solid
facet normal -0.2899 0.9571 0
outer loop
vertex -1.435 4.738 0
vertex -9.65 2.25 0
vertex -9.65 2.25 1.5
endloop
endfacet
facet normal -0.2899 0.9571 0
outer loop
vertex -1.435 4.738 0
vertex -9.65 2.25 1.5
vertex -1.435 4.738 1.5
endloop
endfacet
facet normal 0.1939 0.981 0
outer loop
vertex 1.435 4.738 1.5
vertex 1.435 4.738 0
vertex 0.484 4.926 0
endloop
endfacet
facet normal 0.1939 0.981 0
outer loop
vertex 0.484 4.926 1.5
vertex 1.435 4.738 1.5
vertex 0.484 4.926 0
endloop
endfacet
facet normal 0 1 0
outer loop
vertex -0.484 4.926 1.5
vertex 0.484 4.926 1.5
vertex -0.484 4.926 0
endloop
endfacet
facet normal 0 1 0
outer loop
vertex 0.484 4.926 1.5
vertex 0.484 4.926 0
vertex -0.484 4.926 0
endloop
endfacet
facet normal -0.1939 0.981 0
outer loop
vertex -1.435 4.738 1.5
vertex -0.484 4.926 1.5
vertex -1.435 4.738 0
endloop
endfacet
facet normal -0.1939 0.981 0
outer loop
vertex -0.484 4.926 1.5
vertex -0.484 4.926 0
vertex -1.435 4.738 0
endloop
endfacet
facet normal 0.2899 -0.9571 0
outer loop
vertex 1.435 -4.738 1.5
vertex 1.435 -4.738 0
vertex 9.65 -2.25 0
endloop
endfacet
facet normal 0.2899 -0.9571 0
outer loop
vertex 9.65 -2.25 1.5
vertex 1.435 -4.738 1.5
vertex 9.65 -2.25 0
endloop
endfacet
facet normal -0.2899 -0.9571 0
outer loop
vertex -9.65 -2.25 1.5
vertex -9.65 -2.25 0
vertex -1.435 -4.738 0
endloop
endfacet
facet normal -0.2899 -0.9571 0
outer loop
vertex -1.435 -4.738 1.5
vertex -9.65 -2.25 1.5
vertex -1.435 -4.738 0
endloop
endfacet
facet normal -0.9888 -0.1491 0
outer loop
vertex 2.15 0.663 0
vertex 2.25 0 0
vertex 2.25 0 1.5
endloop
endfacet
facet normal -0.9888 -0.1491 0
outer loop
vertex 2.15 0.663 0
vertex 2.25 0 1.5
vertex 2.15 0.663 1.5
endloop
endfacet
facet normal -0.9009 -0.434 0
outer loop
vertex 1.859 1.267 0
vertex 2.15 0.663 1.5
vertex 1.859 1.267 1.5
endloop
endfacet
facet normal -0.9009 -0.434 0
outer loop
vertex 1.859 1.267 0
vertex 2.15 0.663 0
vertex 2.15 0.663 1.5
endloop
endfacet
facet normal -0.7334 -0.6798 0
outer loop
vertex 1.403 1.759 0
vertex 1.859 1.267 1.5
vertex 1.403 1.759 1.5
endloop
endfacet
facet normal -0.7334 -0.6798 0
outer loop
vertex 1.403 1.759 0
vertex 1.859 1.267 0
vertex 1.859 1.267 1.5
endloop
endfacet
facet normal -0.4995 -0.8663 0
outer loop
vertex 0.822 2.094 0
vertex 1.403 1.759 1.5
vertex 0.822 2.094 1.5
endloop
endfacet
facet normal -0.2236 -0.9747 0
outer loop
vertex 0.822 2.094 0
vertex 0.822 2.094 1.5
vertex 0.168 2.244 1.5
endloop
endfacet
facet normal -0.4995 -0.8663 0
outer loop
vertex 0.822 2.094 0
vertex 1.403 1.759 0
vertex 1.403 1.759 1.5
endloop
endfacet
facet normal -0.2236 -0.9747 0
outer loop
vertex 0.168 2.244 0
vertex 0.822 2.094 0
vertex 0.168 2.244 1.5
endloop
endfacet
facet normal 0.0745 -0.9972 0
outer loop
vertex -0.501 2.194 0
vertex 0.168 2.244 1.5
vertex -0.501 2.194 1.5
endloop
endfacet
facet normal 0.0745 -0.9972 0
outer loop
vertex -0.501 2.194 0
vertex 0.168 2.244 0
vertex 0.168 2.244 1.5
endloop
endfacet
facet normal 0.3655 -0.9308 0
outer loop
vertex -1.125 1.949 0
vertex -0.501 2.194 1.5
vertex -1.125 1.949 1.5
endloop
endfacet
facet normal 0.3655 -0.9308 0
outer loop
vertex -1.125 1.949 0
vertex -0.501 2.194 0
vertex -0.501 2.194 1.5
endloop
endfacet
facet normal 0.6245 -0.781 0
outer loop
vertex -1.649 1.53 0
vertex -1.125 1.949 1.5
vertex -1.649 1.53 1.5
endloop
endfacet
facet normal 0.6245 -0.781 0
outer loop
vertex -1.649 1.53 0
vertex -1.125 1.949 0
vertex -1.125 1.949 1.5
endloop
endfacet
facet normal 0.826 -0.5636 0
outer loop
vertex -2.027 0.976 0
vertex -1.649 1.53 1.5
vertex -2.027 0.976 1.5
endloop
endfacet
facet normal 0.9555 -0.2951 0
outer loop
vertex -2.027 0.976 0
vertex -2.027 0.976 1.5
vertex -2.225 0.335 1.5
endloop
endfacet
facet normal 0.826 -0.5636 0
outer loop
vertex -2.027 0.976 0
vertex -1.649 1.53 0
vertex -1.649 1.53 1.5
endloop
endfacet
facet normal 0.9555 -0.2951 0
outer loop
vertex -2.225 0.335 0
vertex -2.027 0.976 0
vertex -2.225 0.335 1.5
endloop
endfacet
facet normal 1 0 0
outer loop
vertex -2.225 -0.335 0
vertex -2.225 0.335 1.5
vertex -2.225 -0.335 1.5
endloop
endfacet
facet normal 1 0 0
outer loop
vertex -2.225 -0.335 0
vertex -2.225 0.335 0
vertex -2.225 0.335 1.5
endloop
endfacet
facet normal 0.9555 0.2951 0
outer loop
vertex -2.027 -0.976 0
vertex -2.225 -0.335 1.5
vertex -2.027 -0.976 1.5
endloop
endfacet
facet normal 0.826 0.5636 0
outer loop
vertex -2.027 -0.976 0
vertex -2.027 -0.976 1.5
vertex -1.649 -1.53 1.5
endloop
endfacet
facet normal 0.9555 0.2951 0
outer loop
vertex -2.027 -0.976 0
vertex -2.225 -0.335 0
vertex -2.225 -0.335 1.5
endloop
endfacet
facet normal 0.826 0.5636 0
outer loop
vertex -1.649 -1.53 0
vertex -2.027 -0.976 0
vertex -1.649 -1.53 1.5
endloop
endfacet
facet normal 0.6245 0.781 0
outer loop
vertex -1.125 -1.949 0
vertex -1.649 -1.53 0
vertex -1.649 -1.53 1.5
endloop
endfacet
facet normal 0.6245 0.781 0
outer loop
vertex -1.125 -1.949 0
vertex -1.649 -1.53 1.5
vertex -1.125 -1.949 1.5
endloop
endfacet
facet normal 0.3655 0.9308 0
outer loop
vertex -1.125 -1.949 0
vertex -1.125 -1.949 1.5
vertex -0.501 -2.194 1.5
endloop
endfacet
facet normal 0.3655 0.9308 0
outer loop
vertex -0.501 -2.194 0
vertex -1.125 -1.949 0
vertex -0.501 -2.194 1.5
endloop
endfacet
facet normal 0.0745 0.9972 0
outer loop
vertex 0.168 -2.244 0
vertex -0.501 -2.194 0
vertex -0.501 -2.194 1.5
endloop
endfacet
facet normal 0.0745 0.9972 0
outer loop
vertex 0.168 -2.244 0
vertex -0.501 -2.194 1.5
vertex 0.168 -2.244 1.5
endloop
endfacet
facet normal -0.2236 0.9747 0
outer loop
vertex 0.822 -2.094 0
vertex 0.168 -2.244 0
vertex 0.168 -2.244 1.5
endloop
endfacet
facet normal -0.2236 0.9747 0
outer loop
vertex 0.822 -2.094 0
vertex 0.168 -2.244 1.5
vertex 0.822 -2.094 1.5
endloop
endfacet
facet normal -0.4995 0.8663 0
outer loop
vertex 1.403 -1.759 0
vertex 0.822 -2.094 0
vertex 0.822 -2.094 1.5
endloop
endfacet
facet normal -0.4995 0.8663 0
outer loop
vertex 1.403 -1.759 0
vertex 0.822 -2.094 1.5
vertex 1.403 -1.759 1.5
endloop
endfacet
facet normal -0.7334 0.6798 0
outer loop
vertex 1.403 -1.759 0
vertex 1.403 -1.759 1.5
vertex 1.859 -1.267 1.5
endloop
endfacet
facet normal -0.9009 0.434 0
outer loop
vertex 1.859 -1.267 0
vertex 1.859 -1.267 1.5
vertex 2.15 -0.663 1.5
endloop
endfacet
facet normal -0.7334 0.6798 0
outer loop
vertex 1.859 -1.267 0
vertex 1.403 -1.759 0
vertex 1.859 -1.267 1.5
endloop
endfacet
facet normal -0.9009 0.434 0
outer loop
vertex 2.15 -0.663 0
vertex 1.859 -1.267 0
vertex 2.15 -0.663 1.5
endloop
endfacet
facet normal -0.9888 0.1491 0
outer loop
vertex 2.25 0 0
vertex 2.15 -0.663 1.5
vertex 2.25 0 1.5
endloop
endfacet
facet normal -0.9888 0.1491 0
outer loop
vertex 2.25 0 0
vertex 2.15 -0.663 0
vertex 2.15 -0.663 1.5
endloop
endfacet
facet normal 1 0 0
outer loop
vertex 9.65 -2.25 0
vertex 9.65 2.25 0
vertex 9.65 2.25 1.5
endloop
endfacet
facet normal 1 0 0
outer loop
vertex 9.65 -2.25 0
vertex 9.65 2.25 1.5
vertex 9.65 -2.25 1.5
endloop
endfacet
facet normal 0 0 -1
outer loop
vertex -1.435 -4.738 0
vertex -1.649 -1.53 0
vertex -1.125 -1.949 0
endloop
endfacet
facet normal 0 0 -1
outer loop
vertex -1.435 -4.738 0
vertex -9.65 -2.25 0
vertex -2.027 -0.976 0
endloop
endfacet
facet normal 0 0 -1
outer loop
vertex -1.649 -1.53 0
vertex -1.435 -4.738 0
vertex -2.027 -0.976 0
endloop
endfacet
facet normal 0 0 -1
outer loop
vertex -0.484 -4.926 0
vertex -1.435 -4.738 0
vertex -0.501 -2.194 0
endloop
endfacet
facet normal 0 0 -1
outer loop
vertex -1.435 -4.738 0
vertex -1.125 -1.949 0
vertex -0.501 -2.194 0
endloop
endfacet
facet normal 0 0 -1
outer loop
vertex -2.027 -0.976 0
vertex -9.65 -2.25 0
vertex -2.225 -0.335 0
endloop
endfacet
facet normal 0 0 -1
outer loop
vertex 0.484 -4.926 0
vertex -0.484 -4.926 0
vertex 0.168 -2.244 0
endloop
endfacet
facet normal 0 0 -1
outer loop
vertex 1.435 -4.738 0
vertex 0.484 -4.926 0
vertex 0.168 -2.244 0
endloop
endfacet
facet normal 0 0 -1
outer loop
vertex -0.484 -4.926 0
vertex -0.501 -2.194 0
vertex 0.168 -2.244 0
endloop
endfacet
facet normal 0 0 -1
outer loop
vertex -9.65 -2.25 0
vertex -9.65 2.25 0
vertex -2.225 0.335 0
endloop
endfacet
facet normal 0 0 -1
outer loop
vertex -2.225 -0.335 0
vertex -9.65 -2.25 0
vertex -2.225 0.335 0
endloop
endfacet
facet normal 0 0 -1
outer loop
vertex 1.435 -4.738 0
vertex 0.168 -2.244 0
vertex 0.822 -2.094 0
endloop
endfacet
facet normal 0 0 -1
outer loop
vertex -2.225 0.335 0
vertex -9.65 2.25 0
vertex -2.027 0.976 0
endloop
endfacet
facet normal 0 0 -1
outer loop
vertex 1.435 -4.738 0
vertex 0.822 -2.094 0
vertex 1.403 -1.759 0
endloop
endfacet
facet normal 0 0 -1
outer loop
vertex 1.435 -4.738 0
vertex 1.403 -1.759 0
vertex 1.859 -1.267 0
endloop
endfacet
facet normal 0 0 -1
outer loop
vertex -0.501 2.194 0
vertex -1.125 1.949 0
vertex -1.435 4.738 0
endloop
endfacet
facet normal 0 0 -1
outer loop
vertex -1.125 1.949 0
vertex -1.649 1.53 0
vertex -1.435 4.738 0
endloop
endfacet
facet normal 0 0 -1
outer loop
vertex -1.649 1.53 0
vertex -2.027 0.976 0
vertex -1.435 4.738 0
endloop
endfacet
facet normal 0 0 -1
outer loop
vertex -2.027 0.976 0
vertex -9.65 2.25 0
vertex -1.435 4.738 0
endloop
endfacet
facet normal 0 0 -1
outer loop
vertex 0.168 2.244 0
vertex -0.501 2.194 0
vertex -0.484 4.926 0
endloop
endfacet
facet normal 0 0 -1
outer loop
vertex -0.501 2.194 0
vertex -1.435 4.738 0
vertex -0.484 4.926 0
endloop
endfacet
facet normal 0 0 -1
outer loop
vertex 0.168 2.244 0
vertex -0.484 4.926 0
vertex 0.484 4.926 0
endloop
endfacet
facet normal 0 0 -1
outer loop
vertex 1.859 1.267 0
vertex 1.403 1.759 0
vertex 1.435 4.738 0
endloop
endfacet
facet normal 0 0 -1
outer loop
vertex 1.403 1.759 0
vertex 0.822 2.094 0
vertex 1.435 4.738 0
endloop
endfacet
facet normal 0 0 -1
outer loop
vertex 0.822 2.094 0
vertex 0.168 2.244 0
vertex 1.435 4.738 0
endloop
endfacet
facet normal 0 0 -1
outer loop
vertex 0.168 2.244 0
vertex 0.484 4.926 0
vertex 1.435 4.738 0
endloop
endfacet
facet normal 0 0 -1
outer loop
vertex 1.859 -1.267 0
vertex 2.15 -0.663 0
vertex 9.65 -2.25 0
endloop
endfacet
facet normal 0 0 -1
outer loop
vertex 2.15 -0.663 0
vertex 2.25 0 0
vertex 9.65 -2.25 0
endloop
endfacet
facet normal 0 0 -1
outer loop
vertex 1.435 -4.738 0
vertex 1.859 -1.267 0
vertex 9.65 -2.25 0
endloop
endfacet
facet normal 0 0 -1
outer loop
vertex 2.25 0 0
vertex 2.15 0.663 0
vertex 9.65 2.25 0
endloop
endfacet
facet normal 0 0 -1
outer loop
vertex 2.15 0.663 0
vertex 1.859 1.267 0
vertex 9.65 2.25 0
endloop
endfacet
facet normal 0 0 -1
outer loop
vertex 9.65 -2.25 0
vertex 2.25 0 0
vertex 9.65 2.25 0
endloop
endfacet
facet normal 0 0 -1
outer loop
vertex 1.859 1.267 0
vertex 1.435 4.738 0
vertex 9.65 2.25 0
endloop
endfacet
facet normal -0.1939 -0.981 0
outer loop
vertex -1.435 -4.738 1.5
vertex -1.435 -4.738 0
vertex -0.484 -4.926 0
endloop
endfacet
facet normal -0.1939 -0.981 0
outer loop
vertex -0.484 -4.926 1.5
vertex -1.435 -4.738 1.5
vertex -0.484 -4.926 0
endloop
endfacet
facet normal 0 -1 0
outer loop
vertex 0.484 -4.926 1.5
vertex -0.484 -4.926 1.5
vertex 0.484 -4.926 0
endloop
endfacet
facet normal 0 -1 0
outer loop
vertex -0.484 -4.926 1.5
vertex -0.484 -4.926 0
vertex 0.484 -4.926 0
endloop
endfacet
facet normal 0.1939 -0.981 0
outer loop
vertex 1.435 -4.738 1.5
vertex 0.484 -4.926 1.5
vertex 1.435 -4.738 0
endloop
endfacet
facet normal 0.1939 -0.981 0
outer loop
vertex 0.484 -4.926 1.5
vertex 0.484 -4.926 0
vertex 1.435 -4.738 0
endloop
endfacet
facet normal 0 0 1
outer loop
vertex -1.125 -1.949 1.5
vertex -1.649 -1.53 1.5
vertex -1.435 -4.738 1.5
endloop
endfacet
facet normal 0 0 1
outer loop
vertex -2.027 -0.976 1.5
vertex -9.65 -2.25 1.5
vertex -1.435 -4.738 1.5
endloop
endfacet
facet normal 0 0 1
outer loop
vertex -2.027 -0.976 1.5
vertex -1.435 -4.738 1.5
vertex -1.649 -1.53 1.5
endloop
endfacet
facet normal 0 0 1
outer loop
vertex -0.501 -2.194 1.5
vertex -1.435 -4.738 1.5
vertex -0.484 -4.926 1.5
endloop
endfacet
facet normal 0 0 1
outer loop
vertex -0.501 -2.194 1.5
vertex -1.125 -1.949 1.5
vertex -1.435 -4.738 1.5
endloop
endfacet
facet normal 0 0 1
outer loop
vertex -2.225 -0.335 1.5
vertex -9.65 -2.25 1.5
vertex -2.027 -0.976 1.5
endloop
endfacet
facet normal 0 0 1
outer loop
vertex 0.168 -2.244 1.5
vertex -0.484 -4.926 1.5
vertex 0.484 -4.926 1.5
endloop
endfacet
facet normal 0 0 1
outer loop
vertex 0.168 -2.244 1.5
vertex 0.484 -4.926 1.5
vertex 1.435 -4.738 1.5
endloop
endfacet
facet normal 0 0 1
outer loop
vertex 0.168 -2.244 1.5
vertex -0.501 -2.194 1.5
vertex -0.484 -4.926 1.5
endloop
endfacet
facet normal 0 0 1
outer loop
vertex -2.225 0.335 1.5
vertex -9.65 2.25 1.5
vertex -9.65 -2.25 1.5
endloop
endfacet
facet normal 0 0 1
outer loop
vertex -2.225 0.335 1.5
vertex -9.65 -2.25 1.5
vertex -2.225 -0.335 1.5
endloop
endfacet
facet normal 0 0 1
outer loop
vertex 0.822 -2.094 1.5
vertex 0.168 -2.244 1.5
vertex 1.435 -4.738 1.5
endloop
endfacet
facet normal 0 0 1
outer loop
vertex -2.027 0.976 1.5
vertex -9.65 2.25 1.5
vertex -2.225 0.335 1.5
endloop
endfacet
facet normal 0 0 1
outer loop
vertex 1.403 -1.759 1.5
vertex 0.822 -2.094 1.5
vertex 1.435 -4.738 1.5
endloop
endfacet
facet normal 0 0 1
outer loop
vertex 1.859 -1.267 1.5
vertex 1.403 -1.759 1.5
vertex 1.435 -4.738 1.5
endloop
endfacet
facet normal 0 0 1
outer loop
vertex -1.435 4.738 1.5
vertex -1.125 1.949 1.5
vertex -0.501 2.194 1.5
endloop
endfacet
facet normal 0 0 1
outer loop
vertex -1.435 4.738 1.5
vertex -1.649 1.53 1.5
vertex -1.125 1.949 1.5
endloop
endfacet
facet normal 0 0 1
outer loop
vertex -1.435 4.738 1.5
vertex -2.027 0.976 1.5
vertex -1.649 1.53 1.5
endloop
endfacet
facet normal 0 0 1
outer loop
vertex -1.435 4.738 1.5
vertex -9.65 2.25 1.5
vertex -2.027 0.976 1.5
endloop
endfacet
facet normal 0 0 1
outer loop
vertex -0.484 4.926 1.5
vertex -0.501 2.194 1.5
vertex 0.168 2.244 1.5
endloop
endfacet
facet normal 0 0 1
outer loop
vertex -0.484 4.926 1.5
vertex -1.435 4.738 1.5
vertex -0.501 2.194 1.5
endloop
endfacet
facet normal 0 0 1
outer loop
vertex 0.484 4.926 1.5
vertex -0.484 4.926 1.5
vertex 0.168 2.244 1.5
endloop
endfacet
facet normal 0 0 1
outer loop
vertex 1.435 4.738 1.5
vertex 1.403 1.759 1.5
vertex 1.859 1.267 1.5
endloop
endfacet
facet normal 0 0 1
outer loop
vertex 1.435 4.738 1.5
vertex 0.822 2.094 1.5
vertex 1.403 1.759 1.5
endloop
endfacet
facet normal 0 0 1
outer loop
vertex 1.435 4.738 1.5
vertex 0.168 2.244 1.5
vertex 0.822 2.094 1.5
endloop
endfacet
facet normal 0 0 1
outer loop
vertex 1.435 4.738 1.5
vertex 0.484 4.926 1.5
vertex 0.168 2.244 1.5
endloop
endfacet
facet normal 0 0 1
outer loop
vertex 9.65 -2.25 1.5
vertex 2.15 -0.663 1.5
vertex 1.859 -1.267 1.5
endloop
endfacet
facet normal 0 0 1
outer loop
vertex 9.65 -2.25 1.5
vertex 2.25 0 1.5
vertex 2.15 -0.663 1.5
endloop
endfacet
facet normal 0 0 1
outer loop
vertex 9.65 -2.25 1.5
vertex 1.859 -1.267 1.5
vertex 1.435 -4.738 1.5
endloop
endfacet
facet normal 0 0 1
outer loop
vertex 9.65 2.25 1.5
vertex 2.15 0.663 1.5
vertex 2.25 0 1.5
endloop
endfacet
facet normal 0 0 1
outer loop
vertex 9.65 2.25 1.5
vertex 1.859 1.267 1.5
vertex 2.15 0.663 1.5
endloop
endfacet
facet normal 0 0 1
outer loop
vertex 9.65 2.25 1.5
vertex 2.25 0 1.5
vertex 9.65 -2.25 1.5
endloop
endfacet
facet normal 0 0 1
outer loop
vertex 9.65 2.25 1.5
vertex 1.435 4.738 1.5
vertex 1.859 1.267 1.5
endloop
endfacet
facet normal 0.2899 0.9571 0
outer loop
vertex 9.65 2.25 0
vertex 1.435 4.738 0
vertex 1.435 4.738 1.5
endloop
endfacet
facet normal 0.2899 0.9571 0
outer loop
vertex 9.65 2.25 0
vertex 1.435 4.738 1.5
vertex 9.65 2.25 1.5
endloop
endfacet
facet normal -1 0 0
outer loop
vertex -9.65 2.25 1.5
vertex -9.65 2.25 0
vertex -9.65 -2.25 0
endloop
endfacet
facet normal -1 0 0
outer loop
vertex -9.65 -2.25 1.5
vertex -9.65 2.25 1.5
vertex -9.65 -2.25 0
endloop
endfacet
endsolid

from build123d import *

# Parameters (mm, degrees)
SKETCH_R  = 2.25
PAD_DEPTH = 1.5


with BuildPart() as part:
    # Sketch → Pad (new body)
    with BuildSketch(Plane.XY):
        with BuildLine():
            ThreePointArc((1.434501, 4.737584), (0, 4.95), (-1.434501, 4.737584))
            Line((-9.65, 2.25), (-1.434501, 4.737584))
            Line((-9.65, 2.25), (-9.65, -2.25))
            Line((-9.65, -2.25), (-1.434501, -4.737584))
            ThreePointArc((-1.434501, -4.737584), (0, -4.95), (1.434501, -4.737584))
            Line((1.434501, -4.737584), (9.65, -2.25))
            Line((9.65, 2.25), (9.65, -2.25))
            Line((1.434501, 4.737584), (9.65, 2.25))
        make_face()
        Circle(SKETCH_R, mode=Mode.SUBTRACT)
    extrude(amount=PAD_DEPTH)


solid = part.part
